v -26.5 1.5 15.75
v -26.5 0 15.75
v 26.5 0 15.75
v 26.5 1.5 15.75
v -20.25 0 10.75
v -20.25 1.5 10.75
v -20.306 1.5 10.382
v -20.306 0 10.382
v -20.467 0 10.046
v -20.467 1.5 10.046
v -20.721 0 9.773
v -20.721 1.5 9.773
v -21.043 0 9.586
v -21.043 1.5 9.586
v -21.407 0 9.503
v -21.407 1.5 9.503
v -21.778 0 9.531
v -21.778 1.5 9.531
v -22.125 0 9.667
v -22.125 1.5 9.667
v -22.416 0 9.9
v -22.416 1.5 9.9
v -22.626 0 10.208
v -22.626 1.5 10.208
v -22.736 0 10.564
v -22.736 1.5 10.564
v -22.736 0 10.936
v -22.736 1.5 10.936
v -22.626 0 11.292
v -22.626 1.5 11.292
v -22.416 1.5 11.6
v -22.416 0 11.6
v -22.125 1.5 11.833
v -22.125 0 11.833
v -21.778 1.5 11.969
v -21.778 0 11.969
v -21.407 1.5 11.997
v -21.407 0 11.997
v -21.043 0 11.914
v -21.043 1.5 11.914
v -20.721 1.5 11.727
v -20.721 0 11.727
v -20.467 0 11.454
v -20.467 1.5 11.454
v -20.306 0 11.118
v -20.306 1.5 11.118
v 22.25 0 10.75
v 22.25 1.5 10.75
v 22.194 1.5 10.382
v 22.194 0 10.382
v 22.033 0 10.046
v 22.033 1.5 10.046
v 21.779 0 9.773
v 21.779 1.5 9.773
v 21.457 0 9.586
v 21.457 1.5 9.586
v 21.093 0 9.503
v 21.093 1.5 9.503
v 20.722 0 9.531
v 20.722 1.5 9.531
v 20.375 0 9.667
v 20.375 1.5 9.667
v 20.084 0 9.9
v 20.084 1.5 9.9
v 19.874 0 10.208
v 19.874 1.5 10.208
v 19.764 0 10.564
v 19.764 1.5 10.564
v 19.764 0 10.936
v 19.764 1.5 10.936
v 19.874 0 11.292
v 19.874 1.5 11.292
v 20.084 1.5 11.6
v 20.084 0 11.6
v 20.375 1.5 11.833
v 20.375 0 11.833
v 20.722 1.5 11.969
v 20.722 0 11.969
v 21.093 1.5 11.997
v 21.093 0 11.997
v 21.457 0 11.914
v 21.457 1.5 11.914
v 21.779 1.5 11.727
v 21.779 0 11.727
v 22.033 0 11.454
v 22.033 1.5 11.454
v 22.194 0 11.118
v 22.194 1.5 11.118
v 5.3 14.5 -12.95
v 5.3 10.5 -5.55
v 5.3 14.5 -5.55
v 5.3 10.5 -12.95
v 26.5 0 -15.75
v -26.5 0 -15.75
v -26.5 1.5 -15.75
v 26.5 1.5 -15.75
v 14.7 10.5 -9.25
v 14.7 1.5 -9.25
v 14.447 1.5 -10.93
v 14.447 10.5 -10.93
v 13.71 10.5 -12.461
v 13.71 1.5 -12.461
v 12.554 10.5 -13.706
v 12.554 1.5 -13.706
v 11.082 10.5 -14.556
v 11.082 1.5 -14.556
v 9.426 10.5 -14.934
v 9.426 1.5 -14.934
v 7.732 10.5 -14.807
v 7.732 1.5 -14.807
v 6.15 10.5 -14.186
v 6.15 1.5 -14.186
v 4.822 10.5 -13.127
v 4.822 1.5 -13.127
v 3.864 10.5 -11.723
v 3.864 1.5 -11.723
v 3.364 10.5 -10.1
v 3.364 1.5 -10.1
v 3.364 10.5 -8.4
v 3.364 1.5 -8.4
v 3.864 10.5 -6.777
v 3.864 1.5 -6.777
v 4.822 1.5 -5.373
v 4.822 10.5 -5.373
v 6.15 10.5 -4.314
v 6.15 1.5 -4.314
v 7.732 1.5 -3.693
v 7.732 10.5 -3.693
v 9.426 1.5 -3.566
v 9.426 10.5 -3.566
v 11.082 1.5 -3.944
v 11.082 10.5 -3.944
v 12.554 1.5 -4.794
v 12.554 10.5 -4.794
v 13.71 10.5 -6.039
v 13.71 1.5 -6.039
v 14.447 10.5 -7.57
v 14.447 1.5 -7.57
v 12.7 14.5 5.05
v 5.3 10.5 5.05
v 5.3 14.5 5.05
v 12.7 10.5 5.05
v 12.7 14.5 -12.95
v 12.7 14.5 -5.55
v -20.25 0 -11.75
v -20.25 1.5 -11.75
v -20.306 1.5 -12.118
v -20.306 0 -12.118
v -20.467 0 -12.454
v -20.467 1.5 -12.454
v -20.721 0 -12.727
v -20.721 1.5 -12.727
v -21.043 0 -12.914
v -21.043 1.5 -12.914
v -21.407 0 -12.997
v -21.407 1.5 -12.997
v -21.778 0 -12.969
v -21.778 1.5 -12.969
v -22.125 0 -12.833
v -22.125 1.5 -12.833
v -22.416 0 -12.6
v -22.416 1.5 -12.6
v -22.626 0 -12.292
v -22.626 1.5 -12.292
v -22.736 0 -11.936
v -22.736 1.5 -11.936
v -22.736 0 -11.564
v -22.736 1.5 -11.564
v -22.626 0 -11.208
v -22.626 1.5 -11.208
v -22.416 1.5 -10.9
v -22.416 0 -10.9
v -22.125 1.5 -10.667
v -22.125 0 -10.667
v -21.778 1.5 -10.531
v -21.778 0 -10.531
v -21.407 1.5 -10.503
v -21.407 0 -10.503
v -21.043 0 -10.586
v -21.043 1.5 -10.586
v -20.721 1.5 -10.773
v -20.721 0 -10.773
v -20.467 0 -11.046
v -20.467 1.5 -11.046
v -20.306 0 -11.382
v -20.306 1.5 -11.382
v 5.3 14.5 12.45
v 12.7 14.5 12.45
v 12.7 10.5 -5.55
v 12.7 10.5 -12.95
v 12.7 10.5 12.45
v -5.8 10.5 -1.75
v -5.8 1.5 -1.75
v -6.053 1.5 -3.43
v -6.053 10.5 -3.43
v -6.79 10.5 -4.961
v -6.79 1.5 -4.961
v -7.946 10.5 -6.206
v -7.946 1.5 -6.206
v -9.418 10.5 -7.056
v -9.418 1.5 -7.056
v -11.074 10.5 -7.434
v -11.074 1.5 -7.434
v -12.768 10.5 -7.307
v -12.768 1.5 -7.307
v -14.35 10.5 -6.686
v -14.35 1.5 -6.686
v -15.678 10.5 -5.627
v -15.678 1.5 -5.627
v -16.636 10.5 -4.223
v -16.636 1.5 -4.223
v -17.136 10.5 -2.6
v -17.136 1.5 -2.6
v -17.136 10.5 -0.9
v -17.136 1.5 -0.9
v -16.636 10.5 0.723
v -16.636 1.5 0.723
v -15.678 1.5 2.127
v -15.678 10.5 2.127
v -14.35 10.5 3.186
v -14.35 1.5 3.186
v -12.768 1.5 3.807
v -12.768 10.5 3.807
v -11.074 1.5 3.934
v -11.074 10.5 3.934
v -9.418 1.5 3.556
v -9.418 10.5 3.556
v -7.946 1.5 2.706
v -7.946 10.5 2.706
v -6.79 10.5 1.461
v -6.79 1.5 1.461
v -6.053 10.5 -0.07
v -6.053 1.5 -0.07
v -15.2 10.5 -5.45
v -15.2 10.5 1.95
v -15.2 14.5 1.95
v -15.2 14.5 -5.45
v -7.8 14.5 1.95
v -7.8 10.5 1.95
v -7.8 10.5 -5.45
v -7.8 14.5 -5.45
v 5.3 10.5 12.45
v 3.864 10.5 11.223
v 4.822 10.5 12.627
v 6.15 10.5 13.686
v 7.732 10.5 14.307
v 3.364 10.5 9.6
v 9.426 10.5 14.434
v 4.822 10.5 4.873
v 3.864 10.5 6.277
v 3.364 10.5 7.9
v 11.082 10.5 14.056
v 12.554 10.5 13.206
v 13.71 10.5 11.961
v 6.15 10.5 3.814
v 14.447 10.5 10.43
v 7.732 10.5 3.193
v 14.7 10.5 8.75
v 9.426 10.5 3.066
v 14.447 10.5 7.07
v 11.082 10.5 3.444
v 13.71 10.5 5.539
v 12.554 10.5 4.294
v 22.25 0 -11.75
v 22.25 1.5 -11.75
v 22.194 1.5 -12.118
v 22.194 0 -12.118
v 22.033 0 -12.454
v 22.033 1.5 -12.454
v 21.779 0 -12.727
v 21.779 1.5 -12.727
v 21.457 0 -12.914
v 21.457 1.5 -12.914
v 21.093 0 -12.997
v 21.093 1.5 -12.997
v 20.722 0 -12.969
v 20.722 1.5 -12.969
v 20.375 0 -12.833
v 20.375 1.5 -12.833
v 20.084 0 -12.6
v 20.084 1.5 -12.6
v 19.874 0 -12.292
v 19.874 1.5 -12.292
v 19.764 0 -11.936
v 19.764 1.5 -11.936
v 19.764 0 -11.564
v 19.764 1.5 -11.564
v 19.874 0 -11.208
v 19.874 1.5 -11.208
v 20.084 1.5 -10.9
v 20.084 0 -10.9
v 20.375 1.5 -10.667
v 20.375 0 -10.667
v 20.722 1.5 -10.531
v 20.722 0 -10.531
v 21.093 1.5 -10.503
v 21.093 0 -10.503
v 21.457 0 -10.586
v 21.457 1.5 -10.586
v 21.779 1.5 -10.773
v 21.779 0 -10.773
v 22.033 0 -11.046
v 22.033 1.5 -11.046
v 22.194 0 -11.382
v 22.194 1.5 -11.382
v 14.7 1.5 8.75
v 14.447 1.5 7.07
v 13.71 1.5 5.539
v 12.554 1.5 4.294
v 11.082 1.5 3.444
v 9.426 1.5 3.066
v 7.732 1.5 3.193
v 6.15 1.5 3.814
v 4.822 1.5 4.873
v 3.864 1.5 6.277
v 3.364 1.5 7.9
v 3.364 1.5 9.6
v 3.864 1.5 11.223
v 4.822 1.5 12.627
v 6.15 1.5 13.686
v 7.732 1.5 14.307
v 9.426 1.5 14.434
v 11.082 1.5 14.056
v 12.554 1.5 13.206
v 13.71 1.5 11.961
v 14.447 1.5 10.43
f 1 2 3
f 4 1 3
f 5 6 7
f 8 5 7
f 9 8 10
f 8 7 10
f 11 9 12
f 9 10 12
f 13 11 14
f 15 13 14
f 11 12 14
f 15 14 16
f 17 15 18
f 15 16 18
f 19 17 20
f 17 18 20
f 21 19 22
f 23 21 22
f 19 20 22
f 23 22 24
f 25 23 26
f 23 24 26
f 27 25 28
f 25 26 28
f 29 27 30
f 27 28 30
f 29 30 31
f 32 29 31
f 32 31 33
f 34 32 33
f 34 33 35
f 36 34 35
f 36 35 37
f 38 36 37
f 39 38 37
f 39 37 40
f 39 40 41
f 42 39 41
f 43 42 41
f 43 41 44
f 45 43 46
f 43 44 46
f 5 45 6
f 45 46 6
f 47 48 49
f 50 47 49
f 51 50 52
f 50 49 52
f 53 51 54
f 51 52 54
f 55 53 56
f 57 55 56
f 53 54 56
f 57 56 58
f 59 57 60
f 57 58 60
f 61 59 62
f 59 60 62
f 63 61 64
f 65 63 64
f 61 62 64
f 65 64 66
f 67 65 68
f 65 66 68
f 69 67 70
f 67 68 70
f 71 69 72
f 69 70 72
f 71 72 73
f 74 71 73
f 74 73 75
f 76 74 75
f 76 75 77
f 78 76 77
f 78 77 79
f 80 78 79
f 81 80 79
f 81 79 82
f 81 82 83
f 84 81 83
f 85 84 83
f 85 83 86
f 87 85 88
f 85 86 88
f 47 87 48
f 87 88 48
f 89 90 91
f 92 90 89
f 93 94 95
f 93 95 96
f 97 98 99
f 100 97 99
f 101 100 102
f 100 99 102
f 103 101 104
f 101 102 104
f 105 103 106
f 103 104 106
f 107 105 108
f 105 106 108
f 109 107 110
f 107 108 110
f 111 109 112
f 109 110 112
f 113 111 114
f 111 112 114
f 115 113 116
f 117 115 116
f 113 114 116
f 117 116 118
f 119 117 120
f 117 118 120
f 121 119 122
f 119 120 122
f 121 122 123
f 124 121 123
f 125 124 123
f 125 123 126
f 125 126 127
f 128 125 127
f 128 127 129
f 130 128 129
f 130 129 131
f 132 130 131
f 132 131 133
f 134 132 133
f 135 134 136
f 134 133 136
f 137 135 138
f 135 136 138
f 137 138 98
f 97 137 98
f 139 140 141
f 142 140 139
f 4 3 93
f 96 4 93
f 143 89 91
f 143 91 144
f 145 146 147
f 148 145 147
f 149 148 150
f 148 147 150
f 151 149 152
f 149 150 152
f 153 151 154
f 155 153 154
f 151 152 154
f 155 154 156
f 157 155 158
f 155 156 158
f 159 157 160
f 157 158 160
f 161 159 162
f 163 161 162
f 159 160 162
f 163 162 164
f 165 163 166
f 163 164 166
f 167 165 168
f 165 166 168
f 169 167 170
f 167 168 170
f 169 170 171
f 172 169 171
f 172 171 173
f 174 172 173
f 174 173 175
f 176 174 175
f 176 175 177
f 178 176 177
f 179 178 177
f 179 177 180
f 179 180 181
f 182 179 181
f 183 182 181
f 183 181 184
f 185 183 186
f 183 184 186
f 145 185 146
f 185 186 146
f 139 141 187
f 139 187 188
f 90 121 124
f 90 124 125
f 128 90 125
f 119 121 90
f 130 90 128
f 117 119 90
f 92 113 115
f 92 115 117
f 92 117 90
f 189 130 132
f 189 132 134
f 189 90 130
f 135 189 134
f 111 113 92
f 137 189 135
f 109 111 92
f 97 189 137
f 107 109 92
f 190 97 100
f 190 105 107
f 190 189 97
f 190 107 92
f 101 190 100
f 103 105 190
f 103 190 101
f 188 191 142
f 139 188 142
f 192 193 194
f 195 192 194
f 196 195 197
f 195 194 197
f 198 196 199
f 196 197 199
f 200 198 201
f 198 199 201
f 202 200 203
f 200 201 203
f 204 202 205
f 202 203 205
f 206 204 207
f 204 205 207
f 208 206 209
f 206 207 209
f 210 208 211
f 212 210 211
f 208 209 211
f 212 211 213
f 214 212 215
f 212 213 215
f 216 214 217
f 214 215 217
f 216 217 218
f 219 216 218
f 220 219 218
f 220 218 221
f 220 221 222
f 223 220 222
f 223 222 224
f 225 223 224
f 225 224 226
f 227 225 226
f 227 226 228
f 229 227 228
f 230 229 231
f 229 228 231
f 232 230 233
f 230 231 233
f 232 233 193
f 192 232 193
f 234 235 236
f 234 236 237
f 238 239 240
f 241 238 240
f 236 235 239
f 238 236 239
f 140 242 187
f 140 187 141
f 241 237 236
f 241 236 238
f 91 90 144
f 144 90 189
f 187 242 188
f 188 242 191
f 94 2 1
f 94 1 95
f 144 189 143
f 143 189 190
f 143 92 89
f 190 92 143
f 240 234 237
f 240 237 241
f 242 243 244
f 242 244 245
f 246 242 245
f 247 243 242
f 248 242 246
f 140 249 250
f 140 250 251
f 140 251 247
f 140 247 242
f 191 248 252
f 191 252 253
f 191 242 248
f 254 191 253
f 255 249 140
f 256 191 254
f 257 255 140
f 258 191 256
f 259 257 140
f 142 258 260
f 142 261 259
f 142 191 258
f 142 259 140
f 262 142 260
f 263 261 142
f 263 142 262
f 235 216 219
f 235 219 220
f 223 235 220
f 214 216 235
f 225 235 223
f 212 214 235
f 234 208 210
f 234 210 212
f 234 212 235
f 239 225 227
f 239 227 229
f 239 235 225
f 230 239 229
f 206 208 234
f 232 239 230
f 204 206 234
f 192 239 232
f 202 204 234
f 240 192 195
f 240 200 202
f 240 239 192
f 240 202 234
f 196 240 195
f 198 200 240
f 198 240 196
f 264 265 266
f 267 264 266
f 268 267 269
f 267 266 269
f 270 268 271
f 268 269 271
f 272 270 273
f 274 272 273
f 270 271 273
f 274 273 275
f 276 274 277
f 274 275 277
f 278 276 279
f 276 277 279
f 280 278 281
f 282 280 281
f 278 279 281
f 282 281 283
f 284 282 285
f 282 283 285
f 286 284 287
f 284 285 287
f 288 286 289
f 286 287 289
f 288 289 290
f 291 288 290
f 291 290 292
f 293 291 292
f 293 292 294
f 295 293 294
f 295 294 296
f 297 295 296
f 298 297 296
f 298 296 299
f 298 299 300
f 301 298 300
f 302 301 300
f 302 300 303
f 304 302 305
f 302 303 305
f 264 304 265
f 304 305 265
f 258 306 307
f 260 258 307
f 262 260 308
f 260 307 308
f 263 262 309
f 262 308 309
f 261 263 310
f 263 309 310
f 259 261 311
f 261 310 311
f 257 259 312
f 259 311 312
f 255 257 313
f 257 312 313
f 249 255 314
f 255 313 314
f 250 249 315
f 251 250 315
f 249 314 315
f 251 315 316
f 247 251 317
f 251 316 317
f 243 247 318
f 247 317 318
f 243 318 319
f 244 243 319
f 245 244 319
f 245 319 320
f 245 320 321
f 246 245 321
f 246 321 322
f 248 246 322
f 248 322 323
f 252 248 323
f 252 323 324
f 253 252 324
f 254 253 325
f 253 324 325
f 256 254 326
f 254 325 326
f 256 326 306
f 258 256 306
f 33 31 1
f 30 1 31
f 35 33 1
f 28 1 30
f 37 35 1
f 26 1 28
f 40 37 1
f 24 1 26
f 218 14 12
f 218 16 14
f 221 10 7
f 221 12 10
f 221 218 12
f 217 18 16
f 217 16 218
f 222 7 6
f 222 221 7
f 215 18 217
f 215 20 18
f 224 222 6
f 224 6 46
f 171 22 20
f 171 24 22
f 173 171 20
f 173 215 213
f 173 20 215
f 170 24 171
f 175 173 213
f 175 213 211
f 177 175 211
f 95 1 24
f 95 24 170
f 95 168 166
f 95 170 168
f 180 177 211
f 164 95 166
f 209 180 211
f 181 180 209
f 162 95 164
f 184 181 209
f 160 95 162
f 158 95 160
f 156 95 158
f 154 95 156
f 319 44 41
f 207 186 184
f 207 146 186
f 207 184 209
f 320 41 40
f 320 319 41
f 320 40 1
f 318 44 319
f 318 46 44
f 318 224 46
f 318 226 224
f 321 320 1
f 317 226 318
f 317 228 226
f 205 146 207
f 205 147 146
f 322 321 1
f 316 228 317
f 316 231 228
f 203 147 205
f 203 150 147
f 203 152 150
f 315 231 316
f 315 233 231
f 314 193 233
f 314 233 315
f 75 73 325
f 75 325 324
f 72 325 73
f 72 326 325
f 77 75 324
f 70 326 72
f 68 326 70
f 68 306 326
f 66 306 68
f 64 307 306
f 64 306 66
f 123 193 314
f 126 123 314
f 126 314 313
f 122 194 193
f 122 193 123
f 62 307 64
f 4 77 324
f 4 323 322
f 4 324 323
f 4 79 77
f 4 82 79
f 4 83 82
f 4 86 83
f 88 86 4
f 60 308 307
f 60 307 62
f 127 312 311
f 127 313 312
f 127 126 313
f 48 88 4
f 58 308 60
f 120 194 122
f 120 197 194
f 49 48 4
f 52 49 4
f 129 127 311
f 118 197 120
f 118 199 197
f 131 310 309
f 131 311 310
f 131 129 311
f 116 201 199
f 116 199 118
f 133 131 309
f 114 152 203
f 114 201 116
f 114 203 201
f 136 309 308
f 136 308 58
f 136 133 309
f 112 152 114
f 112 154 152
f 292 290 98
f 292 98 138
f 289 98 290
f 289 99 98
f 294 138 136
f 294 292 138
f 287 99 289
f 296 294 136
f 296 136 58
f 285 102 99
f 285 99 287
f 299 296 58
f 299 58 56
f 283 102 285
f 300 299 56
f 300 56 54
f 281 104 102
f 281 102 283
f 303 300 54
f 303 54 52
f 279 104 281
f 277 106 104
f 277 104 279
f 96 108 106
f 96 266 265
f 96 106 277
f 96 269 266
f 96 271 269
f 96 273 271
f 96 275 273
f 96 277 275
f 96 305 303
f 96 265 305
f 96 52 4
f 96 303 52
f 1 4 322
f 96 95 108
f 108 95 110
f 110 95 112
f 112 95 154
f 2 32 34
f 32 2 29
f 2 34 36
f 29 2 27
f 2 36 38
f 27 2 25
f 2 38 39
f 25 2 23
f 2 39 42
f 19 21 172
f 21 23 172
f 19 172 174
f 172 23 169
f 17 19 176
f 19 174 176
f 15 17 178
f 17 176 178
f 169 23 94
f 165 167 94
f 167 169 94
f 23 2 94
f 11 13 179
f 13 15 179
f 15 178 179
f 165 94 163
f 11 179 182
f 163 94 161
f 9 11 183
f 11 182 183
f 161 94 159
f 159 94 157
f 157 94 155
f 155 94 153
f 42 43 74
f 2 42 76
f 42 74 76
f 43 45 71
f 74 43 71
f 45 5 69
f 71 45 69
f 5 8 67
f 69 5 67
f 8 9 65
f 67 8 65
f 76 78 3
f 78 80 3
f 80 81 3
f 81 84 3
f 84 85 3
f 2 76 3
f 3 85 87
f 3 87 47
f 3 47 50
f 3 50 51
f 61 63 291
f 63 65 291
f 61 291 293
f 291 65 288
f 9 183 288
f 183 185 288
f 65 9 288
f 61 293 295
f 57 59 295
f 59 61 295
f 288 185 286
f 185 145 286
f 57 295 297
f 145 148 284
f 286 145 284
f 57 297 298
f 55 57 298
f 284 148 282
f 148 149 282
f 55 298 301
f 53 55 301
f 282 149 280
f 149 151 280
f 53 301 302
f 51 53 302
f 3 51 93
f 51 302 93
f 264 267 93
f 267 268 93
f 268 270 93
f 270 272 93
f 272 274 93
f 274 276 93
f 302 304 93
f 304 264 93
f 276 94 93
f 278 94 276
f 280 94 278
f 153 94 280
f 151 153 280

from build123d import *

# Parameters (mm, degrees)
SCHIZZO1_W                   = 53
SCHIZZO1_H                   = 31.5
ESTRUSIONE_ESTRUSIONE1_DEPTH = 1.5
SCHIZZO2_R                   = 1.25
TAGLIO_ESTRUSIONE1_DEPTH     = 1.5
SCHIZZO3_R                   = 5.7
ESTRUSIONE_ESTRUSIONE2_DEPTH = 9
SCHIZZO4_W                   = 7.4
SCHIZZO4_H                   = 7.4
ESTRUSIONE_ESTRUSIONE3_DEPTH = 4


with BuildPart() as part:
    # Schizzo1 → Estrusione-Estrusione1 (new body)
    with BuildSketch(Plane(origin=(0, 0, 0), x_dir=(1, 0, 0), z_dir=(0, 1, 0))):
        Rectangle(SCHIZZO1_W, SCHIZZO1_H)
    extrude(amount=ESTRUSIONE_ESTRUSIONE1_DEPTH)

    # Schizzo2 → Taglio-Estrusione1 (cut)
    with BuildSketch(Plane(origin=(0, 1.5, 0), x_dir=(1, 0, 0), z_dir=(0, 1, 0))):
        with Locations((-21.5, 11.75)):
            Circle(SCHIZZO2_R)
        with Locations((21, 11.75)):
            Circle(SCHIZZO2_R)
        with Locations((21, -10.75)):
            Circle(SCHIZZO2_R)
        with Locations((-21.5, -10.75)):
            Circle(SCHIZZO2_R)
    extrude(amount=-TAGLIO_ESTRUSIONE1_DEPTH, mode=Mode.SUBTRACT)

    # Schizzo3 → Estrusione-Estrusione2 (add)
    with BuildSketch(Plane(origin=(0, 1.5, 0), x_dir=(1, 0, 0), z_dir=(0, 1, 0))):
        with Locations((-11.5, 1.75)):
            Circle(SCHIZZO3_R)
        with Locations((9, -8.75)):
            Circle(SCHIZZO3_R)
        with Locations((9, 9.25)):
            Circle(SCHIZZO3_R)
    extrude(amount=ESTRUSIONE_ESTRUSIONE2_DEPTH)

    # Schizzo4 → Estrusione-Estrusione3 (add)
    with BuildSketch(Plane(origin=(0, 10.5, 0), x_dir=(1, 0, 0), z_dir=(0, 1, 0))):
        with Locations((-11.5, 1.75)):
            Rectangle(SCHIZZO4_W, SCHIZZO4_H)
        with Locations((9, 9.25)):
            Rectangle(SCHIZZO4_W, SCHIZZO4_H)
        with Locations((9, -8.75)):
            Rectangle(SCHIZZO4_W, SCHIZZO4_H)
    extrude(amount=ESTRUSIONE_ESTRUSIONE3_DEPTH)


solid = part.part
